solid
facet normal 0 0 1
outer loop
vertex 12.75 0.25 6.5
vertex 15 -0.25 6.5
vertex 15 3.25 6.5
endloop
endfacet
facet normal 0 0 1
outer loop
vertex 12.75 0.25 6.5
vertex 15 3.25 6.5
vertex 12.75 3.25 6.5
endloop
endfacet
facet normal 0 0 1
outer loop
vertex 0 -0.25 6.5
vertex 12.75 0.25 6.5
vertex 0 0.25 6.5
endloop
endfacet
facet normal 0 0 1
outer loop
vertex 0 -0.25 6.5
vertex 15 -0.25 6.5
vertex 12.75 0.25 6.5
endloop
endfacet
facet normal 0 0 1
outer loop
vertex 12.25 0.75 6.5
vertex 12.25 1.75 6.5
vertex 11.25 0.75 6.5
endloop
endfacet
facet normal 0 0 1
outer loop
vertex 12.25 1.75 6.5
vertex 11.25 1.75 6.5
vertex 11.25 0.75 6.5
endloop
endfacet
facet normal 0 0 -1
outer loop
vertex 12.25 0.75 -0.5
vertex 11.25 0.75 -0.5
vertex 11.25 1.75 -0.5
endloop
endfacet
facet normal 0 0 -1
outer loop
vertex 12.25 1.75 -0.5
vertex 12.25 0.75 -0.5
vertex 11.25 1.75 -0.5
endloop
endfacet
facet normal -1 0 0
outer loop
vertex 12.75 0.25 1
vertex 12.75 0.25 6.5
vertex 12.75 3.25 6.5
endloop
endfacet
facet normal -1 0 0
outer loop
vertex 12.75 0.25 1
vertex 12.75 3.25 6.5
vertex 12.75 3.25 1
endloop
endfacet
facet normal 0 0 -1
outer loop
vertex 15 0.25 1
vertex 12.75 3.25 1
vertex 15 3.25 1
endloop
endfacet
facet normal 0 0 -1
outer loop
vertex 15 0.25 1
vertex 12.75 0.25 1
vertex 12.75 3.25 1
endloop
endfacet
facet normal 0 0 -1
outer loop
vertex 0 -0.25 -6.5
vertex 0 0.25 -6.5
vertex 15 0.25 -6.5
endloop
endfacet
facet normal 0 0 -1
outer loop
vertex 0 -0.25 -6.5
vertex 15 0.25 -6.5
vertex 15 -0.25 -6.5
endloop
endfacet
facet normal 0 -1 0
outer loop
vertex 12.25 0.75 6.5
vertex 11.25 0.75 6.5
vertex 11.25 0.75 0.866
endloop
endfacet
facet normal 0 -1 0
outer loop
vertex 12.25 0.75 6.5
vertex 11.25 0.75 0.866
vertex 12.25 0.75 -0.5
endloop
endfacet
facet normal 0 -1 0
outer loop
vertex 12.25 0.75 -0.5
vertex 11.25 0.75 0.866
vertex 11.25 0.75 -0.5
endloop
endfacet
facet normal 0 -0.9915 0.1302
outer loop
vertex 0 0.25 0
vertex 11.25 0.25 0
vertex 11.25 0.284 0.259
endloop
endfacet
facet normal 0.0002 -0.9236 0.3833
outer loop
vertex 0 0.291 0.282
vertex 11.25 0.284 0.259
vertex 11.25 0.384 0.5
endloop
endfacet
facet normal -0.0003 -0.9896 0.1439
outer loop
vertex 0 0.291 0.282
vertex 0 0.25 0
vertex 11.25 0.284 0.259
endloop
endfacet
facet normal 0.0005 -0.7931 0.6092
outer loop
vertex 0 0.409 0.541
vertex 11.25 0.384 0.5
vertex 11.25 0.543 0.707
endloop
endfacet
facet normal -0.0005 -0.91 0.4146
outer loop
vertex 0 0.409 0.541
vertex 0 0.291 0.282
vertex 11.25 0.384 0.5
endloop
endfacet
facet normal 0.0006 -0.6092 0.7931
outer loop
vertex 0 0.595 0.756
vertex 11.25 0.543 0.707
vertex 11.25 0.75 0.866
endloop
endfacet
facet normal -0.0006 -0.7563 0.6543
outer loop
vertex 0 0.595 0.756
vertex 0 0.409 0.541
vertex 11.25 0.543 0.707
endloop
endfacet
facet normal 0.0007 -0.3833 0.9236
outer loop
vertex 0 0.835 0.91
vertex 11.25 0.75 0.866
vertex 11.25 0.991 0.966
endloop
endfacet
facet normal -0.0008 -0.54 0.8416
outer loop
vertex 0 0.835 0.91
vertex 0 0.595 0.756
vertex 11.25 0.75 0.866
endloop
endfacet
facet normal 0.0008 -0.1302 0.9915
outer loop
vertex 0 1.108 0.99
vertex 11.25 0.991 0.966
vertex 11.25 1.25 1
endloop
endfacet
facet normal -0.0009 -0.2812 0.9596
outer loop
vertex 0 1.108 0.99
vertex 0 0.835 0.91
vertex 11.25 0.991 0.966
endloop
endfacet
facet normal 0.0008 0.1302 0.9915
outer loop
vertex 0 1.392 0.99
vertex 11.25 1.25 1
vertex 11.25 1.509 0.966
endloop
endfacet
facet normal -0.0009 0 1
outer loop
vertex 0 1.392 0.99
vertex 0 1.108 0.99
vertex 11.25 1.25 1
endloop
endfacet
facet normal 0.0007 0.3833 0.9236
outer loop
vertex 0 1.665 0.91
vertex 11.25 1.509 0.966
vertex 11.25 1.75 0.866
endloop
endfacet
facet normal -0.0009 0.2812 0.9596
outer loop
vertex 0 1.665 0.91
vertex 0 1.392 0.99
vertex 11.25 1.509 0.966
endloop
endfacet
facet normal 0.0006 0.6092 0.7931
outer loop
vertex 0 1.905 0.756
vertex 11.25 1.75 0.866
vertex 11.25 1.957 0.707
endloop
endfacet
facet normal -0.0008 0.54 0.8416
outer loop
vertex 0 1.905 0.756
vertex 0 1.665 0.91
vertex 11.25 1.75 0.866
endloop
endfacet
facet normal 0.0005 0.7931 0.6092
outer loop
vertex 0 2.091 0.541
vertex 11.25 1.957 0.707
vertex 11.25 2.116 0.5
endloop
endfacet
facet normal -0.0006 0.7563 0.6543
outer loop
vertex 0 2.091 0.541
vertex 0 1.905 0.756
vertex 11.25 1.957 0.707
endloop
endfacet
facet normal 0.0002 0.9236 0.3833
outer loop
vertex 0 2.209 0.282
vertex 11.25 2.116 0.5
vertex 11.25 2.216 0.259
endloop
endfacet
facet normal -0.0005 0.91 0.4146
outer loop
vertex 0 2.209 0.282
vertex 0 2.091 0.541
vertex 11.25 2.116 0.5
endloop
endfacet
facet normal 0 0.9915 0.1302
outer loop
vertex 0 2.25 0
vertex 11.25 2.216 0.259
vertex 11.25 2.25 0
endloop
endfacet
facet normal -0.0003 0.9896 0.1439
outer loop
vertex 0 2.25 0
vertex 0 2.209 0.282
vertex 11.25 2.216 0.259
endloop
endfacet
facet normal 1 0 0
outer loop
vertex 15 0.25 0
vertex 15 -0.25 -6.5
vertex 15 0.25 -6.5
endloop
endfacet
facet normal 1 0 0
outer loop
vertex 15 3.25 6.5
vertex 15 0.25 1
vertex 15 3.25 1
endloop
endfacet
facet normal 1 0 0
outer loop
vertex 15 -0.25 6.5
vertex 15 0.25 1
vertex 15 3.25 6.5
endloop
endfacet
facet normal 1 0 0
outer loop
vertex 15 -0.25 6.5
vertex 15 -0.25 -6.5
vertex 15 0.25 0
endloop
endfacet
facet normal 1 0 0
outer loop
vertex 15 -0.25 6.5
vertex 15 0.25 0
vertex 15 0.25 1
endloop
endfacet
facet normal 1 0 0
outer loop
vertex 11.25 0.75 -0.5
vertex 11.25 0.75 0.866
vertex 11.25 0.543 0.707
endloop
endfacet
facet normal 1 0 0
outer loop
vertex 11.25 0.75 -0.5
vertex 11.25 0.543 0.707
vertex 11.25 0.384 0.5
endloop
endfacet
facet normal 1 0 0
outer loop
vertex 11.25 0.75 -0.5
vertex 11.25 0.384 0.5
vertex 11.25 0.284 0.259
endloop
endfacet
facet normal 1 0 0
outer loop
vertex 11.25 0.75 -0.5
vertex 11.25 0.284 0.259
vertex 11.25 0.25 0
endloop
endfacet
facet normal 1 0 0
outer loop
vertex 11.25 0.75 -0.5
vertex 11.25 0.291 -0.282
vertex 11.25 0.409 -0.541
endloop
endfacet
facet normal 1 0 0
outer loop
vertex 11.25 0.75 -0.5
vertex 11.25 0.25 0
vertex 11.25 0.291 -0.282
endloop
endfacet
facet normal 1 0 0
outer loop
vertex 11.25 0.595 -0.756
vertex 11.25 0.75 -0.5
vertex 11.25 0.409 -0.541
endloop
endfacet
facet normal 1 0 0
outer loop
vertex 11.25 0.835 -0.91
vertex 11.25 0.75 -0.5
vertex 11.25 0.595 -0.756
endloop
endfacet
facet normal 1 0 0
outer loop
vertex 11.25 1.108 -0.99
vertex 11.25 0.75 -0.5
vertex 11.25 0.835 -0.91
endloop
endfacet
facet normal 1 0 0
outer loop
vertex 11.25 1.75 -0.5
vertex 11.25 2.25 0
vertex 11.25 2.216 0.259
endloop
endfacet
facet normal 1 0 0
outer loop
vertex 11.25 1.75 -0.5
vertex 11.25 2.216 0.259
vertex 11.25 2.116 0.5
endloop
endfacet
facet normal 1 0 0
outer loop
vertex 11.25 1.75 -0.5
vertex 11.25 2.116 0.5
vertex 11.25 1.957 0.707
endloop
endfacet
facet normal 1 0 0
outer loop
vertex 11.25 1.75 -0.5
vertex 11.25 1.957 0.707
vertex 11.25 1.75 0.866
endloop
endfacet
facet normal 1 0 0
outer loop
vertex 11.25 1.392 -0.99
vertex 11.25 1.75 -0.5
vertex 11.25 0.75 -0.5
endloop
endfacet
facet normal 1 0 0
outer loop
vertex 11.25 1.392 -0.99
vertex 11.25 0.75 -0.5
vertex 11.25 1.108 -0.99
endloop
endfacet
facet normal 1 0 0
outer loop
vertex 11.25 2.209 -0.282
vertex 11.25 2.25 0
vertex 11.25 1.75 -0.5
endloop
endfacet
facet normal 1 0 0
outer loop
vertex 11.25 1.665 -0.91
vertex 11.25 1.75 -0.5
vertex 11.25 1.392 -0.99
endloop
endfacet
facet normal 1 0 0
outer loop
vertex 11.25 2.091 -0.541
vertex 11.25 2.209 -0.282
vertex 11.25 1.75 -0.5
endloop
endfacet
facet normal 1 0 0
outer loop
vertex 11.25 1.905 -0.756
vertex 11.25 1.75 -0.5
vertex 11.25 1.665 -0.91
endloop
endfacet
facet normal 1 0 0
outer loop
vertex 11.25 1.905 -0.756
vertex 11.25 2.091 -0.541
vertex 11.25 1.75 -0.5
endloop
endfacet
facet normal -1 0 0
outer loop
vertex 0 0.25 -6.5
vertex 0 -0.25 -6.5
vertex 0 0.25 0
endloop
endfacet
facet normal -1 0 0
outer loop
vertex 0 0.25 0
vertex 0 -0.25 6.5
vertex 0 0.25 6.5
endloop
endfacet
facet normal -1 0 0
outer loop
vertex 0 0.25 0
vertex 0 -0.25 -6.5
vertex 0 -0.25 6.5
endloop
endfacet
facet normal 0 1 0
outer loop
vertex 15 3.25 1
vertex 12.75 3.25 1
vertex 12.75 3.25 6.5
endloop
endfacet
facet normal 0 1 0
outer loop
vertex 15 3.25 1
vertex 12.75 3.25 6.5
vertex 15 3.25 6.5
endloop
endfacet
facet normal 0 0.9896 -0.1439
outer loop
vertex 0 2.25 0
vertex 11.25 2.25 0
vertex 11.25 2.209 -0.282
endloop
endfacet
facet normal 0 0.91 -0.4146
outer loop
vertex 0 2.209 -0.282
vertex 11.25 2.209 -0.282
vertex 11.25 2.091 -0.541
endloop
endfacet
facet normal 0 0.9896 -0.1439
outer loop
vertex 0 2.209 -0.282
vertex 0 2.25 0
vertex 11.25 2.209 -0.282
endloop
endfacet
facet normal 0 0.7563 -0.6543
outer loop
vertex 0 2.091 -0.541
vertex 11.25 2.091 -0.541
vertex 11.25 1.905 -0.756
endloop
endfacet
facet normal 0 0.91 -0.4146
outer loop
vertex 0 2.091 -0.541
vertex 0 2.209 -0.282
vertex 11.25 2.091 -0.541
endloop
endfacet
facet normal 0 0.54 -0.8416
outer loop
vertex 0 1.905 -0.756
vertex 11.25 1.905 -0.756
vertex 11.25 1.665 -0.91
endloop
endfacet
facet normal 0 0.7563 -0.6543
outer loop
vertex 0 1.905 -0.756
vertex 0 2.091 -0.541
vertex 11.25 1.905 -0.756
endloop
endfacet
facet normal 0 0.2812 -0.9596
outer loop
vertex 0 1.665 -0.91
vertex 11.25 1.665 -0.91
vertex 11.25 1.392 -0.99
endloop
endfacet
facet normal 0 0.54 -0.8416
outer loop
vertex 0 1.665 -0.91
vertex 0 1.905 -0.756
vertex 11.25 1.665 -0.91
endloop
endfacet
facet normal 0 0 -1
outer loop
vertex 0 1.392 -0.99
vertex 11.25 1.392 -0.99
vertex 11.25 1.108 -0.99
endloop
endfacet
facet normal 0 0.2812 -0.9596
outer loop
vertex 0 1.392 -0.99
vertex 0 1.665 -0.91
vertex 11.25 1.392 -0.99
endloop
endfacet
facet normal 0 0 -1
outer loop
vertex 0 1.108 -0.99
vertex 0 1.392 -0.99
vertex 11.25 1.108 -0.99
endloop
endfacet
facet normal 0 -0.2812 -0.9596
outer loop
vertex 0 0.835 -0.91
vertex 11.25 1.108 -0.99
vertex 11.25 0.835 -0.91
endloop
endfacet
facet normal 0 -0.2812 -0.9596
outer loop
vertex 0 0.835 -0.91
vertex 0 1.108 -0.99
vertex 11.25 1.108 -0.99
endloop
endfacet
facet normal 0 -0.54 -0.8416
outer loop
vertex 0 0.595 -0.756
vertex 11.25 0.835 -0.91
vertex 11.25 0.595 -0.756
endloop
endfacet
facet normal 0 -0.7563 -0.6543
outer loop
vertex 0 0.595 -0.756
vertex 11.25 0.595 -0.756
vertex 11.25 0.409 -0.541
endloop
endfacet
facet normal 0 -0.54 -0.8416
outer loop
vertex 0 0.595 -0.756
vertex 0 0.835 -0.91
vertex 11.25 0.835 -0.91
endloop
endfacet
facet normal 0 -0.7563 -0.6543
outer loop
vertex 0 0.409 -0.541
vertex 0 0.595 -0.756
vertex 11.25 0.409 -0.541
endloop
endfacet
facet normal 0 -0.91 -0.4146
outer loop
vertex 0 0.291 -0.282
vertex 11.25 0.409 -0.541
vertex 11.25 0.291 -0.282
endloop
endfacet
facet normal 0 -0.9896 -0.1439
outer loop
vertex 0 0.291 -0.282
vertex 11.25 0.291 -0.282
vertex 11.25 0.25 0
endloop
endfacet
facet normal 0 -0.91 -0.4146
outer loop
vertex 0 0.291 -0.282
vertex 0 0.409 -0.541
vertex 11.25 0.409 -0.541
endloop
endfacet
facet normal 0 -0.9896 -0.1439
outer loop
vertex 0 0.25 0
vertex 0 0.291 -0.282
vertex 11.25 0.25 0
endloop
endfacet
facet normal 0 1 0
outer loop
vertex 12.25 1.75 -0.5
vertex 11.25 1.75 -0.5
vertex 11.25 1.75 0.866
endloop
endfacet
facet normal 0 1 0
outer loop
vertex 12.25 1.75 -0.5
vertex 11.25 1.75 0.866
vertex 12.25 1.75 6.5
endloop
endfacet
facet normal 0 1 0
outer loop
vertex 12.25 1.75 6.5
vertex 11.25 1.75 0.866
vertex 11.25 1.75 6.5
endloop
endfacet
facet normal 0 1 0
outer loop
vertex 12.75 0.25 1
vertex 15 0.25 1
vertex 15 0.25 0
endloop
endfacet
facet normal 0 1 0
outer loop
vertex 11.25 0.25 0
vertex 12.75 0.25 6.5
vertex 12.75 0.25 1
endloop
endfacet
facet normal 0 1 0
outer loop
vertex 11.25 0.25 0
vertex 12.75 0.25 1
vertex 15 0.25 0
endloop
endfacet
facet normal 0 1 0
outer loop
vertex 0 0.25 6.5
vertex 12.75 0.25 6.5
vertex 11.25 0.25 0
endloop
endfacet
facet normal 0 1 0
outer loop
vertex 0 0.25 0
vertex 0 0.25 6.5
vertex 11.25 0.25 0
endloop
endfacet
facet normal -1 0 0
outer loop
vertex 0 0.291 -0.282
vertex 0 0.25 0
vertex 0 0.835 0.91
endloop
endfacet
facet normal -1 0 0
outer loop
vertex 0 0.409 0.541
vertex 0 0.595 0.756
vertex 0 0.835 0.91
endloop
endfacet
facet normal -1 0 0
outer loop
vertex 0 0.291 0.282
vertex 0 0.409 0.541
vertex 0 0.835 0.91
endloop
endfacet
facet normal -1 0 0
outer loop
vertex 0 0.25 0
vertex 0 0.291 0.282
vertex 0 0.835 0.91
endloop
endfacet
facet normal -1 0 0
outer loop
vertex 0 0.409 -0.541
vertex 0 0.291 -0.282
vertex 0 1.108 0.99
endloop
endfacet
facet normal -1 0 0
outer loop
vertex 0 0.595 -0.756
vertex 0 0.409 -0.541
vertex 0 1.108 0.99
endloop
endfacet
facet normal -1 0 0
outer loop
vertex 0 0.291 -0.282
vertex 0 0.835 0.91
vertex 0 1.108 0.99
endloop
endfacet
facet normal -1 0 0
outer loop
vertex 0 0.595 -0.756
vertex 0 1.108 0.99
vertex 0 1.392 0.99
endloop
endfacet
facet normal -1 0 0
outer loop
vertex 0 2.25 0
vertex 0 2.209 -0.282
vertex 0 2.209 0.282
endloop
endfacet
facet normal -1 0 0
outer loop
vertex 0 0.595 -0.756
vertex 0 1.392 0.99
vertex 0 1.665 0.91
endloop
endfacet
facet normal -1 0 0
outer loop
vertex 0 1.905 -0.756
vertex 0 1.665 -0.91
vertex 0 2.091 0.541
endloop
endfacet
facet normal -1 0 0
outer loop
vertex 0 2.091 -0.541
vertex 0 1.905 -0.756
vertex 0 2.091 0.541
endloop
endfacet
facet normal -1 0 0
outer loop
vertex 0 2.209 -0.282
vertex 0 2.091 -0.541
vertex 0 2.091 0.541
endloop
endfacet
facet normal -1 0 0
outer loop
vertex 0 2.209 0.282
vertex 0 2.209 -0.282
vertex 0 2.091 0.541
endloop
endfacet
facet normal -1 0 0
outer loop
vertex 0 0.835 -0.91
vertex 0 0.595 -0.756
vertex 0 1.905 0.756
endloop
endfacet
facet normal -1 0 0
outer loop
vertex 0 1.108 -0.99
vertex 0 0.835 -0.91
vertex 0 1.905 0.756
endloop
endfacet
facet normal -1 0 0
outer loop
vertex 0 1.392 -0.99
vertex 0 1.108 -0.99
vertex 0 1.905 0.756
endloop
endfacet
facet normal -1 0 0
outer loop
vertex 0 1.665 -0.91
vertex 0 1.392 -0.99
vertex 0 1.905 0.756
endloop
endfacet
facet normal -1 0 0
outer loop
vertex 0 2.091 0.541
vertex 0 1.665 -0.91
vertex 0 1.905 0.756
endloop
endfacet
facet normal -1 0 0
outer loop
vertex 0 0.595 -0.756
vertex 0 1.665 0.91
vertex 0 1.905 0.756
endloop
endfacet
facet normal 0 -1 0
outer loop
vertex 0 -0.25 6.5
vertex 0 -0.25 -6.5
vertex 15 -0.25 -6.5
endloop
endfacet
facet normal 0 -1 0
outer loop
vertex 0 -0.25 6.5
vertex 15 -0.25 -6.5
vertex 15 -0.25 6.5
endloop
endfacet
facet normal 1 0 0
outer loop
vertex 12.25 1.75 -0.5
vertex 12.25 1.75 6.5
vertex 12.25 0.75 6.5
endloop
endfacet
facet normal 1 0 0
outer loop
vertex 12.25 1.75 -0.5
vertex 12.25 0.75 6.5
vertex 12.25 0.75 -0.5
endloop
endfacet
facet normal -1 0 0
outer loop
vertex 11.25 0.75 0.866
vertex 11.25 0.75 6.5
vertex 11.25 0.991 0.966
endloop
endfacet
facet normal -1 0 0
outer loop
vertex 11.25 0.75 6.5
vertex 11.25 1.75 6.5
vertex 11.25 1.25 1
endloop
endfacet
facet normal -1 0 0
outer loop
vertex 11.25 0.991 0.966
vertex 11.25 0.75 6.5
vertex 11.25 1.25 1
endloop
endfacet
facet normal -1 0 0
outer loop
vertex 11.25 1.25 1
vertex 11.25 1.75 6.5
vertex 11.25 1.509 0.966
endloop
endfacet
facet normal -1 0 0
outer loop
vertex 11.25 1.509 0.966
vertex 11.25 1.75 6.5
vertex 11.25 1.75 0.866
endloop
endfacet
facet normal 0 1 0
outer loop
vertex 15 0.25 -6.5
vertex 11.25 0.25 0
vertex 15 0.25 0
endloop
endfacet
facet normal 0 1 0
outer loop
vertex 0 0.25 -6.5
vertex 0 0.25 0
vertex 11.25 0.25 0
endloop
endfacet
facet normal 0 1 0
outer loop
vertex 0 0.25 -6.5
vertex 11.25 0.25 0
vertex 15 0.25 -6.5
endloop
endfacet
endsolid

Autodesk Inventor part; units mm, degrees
ref_plane "YZ Plane" through (0, 0, 0) normal (1, 0, 0) x (0, 1, 0)
ref_plane "XZ Plane" through (0, 0, 0) normal (0, 1, 0) x (-1, 0, 0)
ref_plane "XY Plane" through (0, 0, 0) normal (0, 0, 1) x (1, 0, 0)
sketch "Sketch1" plane through (0, 0, 0) normal (1, 0, 0) x (0, 1, 0)
  line L0 (-0.25, 6.5) -> (0.25, 6.5)
  line L1 (0.25, 6.5) -> (0.25, -6.5)
  line L2 (0.25, -6.5) -> (-0.25, -6.5)
  line L3 (-0.25, -6.5) -> (-0.25, 6.5)
  line L4 (-0.25, 6.5) -> (0.25, -6.5) construction
  line L5 (0.25, 6.5) -> (-0.25, -6.5) construction
  circle A0 centre (1.25, 0) radius 1
  point P0 (0, 0)
  point P1 (0, 0)
  dimension "d0" = 0.5
  dimension "d1" = 13
  dimension "d2" = 2
extrude "Extrusion1" add sketch "Sketch1" along normal blind 15
sketch "Sketch2" plane through (15, 1.25, 0) normal (1, 0, 0) x (0, 0, -1)
  circle A0 centre (0, 0) radius 1
  point P0 (0, -1.25)
extrude "Extrusion2" cut sketch "Sketch2" against normal blind 3.75
sketch "Sketch3" plane through (11.25, 1.25, 0) normal (1, 0, 0) x (0, 0, -1)
  line L0 (0.5, 0.5) -> (-6.5, 0.5)
  line L1 (-6.5, 0.5) -> (-6.5, -0.5)
  line L2 (-6.5, -0.5) -> (0.5, -0.5)
  line L3 (0.5, -0.5) -> (0.5, 0.5)
  line L4 (0.5, 0.5) -> (-6.5, -0.5) construction
  line L5 (-6.5, 0.5) -> (0.5, -0.5) construction
  circle A0 centre (0, 0) radius 1 projected
  line L6 (-6.5, -1) -> (-6.5, -1.5) projected
  point P0 (0, -1.25)
  point P1 (-3, 0)
  point P2 (0, -1)
  point P3 (-3, 0)
  dimension "d11" = 0.5
  dimension "d12" = 1
  dimension "d7" = 0.5
  dimension "d8" = 1
extrude "Extrusion3" add sketch "Sketch3" along normal blind 1 contours L3 L2 A0 L0 | A0 L2 L1 L0 picked at (0.0018, -0.0348)
sketch "Sketch4" plane through (0, 0.25, 6.5) normal (0, 1, 0) x (1, 0, 0)
  line L0 (15, 13) -> (15, 0) projected
  line L1 (15, 0) -> (12.75, 0)
  line L2 (12.75, 0) -> (12.75, 5.5)
  line L3 (12.75, 5.5) -> (15, 5.5)
  line L4 (15, 5.5) -> (15, 0)
  line L5 (12.25, 7) -> (12.25, 0) projected
  line L6 (0, 6.5) -> (11.25, 6.5) projected
  dimension "d11" = 0.5
  dimension "d12" = 1
extrude "Extrusion4" add sketch "Sketch4" along normal blind 3
properties part number "latch" material "Stainless Steel"
